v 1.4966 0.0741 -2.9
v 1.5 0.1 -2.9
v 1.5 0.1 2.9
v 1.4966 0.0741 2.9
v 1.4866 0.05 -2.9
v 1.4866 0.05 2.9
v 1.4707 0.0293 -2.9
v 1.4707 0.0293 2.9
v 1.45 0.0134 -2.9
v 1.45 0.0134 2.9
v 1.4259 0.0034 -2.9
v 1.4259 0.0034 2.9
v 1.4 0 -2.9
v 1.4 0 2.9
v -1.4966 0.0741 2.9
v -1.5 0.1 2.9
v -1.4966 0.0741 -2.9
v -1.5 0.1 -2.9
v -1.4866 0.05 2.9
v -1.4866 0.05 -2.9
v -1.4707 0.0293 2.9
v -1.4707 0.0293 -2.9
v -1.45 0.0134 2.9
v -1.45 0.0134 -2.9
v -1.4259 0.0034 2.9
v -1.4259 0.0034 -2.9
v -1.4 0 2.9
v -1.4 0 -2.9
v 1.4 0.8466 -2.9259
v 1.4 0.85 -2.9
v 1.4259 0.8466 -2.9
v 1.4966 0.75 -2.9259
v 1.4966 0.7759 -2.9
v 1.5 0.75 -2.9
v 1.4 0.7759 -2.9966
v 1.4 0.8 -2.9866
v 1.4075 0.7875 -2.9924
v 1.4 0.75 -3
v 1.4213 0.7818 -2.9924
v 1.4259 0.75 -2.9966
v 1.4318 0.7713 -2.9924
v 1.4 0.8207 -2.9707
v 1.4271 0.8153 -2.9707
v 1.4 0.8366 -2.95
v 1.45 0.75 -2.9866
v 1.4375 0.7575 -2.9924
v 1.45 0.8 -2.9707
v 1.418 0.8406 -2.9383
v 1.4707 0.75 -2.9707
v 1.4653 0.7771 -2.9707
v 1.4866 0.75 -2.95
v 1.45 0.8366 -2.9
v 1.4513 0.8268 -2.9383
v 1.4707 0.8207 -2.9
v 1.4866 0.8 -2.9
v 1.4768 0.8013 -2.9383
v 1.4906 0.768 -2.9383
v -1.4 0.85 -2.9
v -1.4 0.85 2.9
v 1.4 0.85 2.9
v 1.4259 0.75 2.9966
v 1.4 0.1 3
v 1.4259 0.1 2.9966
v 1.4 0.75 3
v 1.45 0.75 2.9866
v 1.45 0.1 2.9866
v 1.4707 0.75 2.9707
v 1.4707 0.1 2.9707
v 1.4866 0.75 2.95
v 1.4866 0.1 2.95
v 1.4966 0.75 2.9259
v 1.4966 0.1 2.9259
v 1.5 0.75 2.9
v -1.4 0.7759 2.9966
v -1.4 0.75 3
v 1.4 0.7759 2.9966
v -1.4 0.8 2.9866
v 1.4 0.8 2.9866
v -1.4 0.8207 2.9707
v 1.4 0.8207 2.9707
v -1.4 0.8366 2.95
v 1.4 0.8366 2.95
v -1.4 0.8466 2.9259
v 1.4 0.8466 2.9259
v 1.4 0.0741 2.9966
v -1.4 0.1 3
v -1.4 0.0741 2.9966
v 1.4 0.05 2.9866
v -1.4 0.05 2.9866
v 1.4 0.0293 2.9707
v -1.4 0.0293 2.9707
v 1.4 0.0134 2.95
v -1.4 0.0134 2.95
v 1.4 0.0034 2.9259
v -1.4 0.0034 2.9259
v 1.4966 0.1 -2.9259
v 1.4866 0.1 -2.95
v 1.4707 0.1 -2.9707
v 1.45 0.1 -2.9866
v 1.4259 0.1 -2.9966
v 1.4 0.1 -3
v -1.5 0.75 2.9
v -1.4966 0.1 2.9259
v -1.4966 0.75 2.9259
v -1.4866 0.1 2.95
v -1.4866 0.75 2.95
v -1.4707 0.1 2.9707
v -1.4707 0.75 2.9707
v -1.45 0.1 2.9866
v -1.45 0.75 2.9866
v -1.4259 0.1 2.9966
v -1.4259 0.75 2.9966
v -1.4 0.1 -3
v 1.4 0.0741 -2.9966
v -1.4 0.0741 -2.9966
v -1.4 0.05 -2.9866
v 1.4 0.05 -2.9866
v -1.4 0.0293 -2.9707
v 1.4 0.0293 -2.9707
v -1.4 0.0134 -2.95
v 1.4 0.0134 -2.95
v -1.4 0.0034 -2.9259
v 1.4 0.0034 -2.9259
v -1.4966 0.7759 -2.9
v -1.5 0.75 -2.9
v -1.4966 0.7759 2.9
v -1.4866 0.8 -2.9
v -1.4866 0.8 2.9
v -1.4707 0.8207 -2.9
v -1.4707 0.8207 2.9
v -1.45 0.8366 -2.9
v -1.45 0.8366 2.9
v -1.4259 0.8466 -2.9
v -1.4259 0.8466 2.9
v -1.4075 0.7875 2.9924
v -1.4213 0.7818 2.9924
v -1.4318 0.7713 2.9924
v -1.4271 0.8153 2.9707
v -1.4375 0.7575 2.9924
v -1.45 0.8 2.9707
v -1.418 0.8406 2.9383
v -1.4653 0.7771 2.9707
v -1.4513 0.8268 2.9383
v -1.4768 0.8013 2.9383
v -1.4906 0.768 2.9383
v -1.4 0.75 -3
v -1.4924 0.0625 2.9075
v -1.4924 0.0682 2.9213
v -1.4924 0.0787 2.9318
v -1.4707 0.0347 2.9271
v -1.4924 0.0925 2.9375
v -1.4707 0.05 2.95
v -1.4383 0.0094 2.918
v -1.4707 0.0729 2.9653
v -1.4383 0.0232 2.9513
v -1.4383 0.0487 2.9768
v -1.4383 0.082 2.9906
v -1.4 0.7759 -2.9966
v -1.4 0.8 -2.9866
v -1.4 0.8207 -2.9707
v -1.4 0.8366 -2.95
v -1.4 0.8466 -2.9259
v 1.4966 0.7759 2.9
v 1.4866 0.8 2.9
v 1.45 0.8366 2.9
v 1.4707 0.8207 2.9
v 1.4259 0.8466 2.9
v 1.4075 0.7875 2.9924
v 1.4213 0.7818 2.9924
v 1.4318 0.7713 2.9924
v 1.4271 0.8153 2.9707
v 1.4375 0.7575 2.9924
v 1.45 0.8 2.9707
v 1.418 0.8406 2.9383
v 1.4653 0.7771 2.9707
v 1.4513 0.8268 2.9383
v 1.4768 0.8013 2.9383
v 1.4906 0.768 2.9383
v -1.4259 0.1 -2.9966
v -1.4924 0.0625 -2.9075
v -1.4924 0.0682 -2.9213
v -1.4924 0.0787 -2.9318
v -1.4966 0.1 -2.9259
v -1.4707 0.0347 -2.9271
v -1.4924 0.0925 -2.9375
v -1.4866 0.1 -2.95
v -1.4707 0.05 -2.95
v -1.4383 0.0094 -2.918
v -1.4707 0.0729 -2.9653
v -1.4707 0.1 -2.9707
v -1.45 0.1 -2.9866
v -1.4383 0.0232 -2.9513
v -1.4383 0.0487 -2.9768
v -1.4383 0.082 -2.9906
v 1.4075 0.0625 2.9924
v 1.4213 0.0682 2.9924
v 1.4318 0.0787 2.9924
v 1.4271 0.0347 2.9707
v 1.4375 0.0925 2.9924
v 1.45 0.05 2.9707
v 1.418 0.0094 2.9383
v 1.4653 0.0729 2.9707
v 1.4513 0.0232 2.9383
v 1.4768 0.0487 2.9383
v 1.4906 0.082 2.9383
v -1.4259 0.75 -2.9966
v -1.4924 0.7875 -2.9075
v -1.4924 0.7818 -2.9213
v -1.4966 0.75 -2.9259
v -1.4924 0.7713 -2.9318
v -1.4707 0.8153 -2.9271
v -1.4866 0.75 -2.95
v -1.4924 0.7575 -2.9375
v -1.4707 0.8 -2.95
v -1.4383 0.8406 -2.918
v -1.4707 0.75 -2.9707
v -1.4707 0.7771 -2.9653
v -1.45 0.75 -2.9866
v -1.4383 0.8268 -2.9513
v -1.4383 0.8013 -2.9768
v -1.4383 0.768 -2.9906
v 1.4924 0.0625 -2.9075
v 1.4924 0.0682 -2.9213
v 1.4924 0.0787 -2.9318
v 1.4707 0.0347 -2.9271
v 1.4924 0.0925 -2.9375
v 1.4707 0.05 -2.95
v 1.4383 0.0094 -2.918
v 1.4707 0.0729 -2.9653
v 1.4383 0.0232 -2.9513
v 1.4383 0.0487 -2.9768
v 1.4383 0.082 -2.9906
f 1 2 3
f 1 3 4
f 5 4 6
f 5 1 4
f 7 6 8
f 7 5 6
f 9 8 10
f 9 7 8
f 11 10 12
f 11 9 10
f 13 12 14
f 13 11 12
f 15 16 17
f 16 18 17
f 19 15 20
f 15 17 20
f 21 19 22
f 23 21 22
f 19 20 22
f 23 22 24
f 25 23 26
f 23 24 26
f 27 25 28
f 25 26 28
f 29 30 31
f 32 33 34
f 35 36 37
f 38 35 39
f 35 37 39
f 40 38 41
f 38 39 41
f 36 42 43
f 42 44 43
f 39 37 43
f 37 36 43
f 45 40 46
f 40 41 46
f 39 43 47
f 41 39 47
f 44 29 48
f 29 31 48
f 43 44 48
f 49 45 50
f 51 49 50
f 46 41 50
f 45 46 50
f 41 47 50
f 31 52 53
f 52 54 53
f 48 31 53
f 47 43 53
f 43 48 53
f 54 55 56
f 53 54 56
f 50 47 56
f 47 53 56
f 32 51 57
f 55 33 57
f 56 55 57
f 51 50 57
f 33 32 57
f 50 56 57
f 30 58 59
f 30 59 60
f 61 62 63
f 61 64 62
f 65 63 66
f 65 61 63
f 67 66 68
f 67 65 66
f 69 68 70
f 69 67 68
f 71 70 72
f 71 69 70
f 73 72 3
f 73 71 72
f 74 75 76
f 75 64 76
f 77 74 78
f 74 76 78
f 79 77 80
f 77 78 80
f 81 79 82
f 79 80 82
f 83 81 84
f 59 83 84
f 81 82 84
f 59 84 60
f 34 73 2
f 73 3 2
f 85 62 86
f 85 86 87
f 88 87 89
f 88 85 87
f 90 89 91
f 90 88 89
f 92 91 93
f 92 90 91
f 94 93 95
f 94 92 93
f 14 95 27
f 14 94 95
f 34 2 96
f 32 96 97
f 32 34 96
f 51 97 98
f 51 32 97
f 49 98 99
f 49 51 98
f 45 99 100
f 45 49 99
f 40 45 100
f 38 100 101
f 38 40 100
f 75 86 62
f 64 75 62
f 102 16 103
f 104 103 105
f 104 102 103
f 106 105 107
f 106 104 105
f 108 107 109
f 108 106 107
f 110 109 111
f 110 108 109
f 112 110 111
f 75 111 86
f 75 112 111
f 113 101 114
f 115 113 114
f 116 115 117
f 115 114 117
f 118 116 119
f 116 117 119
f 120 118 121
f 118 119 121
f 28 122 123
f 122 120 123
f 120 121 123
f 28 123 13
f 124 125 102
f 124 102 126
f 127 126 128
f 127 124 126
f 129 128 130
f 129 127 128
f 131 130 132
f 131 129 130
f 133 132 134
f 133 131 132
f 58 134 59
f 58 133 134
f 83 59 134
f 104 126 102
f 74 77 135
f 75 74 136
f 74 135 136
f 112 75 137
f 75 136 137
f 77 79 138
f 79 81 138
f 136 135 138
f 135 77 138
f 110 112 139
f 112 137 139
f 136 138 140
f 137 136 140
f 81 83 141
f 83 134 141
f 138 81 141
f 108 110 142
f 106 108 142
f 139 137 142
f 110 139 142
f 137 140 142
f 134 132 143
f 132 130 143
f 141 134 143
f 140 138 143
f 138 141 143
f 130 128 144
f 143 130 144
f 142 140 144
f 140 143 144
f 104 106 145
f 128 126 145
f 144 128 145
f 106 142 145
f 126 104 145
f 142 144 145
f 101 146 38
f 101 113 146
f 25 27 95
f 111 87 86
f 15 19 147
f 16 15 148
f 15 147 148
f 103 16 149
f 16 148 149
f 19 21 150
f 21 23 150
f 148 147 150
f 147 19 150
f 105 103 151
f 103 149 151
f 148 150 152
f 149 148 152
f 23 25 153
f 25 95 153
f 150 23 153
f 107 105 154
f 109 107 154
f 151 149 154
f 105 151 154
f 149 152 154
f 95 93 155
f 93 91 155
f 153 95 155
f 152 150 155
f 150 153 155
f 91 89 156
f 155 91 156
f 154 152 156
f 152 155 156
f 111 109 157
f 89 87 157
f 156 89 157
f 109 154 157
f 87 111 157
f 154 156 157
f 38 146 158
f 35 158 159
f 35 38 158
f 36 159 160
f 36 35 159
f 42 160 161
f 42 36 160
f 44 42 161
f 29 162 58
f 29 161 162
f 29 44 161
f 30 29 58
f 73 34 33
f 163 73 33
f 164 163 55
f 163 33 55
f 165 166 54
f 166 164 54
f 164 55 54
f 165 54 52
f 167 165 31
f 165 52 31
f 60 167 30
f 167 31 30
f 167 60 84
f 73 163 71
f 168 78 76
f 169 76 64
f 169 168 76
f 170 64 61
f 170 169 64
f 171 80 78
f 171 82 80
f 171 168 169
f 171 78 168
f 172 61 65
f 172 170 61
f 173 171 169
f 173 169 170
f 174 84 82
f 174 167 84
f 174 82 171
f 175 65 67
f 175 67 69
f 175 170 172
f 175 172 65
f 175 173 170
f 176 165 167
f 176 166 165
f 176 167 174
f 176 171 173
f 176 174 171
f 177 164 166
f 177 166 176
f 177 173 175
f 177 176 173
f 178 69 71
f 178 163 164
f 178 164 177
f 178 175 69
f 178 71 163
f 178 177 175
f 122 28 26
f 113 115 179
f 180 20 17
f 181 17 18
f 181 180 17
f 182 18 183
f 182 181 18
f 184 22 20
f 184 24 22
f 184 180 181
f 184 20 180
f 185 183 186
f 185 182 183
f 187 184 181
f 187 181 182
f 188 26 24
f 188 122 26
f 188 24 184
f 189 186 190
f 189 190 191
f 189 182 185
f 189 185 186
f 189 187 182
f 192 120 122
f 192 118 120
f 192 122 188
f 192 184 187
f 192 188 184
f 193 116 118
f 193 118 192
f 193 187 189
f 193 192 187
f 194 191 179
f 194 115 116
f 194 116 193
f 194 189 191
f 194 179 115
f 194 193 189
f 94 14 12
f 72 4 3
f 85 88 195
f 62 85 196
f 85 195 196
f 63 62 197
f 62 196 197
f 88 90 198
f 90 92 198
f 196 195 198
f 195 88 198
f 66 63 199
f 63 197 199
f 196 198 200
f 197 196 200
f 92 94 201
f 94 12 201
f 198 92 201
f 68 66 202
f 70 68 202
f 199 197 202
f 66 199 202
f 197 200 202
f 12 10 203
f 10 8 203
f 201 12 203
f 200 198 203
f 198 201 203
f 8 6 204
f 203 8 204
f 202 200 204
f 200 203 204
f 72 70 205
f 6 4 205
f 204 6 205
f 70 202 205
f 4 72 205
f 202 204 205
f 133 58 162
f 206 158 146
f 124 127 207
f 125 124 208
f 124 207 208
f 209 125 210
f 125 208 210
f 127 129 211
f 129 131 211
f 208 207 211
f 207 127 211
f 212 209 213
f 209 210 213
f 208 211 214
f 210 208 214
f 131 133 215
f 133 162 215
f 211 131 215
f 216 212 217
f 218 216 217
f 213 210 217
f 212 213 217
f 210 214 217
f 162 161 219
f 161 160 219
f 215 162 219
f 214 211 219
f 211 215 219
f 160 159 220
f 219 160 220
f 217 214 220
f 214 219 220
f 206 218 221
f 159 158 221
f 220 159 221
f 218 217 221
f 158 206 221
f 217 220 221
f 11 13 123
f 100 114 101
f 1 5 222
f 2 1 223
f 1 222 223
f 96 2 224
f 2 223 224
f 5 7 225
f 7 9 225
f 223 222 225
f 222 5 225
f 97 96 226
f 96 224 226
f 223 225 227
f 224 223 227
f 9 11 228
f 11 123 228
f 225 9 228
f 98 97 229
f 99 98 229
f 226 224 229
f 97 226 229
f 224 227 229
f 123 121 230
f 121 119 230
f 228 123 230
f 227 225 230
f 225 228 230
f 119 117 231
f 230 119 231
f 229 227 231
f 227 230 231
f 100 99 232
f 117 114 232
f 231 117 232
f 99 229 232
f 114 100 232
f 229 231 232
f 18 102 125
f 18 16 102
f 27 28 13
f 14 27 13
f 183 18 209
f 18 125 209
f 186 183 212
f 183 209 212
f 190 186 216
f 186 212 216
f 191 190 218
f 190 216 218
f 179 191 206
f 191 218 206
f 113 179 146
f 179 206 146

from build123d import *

# Parameters (mm, degrees)
ESQUISSE3_W        = 3
ESQUISSE3_H        = 6
BOSS_EXTRU_2_DEPTH = 0.85
CONG_2_R           = 0.1


with BuildPart() as part:
    # Esquisse3 → Boss.-Extru.2 (new body)
    with BuildSketch(Plane(origin=(0, 0, 0), x_dir=(1, 0, 0), z_dir=(0, 1, 0))):
        Rectangle(ESQUISSE3_W, ESQUISSE3_H)
    extrude(amount=BOSS_EXTRU_2_DEPTH)

    # Congé2
    cong_2_edges = [part.edges().sort_by_distance(p)[0] for p in [
        (1.5, 0.85, 0),
        (0, 0.85, -3),
        (-1.5, 0.85, 0),
        (0, 0, -3),
        (1.5, 0, 0),
        (0, 0, 3),
        (-1.5, 0, 0),
        (0, 0.85, 3),
        (-1.5, 0.425, -3),
        (1.5, 0.425, -3),
        (1.5, 0.425, 3),
        (-1.5, 0.425, 3),
    ]]
    fillet(cong_2_edges, radius=CONG_2_R)


solid = part.part
